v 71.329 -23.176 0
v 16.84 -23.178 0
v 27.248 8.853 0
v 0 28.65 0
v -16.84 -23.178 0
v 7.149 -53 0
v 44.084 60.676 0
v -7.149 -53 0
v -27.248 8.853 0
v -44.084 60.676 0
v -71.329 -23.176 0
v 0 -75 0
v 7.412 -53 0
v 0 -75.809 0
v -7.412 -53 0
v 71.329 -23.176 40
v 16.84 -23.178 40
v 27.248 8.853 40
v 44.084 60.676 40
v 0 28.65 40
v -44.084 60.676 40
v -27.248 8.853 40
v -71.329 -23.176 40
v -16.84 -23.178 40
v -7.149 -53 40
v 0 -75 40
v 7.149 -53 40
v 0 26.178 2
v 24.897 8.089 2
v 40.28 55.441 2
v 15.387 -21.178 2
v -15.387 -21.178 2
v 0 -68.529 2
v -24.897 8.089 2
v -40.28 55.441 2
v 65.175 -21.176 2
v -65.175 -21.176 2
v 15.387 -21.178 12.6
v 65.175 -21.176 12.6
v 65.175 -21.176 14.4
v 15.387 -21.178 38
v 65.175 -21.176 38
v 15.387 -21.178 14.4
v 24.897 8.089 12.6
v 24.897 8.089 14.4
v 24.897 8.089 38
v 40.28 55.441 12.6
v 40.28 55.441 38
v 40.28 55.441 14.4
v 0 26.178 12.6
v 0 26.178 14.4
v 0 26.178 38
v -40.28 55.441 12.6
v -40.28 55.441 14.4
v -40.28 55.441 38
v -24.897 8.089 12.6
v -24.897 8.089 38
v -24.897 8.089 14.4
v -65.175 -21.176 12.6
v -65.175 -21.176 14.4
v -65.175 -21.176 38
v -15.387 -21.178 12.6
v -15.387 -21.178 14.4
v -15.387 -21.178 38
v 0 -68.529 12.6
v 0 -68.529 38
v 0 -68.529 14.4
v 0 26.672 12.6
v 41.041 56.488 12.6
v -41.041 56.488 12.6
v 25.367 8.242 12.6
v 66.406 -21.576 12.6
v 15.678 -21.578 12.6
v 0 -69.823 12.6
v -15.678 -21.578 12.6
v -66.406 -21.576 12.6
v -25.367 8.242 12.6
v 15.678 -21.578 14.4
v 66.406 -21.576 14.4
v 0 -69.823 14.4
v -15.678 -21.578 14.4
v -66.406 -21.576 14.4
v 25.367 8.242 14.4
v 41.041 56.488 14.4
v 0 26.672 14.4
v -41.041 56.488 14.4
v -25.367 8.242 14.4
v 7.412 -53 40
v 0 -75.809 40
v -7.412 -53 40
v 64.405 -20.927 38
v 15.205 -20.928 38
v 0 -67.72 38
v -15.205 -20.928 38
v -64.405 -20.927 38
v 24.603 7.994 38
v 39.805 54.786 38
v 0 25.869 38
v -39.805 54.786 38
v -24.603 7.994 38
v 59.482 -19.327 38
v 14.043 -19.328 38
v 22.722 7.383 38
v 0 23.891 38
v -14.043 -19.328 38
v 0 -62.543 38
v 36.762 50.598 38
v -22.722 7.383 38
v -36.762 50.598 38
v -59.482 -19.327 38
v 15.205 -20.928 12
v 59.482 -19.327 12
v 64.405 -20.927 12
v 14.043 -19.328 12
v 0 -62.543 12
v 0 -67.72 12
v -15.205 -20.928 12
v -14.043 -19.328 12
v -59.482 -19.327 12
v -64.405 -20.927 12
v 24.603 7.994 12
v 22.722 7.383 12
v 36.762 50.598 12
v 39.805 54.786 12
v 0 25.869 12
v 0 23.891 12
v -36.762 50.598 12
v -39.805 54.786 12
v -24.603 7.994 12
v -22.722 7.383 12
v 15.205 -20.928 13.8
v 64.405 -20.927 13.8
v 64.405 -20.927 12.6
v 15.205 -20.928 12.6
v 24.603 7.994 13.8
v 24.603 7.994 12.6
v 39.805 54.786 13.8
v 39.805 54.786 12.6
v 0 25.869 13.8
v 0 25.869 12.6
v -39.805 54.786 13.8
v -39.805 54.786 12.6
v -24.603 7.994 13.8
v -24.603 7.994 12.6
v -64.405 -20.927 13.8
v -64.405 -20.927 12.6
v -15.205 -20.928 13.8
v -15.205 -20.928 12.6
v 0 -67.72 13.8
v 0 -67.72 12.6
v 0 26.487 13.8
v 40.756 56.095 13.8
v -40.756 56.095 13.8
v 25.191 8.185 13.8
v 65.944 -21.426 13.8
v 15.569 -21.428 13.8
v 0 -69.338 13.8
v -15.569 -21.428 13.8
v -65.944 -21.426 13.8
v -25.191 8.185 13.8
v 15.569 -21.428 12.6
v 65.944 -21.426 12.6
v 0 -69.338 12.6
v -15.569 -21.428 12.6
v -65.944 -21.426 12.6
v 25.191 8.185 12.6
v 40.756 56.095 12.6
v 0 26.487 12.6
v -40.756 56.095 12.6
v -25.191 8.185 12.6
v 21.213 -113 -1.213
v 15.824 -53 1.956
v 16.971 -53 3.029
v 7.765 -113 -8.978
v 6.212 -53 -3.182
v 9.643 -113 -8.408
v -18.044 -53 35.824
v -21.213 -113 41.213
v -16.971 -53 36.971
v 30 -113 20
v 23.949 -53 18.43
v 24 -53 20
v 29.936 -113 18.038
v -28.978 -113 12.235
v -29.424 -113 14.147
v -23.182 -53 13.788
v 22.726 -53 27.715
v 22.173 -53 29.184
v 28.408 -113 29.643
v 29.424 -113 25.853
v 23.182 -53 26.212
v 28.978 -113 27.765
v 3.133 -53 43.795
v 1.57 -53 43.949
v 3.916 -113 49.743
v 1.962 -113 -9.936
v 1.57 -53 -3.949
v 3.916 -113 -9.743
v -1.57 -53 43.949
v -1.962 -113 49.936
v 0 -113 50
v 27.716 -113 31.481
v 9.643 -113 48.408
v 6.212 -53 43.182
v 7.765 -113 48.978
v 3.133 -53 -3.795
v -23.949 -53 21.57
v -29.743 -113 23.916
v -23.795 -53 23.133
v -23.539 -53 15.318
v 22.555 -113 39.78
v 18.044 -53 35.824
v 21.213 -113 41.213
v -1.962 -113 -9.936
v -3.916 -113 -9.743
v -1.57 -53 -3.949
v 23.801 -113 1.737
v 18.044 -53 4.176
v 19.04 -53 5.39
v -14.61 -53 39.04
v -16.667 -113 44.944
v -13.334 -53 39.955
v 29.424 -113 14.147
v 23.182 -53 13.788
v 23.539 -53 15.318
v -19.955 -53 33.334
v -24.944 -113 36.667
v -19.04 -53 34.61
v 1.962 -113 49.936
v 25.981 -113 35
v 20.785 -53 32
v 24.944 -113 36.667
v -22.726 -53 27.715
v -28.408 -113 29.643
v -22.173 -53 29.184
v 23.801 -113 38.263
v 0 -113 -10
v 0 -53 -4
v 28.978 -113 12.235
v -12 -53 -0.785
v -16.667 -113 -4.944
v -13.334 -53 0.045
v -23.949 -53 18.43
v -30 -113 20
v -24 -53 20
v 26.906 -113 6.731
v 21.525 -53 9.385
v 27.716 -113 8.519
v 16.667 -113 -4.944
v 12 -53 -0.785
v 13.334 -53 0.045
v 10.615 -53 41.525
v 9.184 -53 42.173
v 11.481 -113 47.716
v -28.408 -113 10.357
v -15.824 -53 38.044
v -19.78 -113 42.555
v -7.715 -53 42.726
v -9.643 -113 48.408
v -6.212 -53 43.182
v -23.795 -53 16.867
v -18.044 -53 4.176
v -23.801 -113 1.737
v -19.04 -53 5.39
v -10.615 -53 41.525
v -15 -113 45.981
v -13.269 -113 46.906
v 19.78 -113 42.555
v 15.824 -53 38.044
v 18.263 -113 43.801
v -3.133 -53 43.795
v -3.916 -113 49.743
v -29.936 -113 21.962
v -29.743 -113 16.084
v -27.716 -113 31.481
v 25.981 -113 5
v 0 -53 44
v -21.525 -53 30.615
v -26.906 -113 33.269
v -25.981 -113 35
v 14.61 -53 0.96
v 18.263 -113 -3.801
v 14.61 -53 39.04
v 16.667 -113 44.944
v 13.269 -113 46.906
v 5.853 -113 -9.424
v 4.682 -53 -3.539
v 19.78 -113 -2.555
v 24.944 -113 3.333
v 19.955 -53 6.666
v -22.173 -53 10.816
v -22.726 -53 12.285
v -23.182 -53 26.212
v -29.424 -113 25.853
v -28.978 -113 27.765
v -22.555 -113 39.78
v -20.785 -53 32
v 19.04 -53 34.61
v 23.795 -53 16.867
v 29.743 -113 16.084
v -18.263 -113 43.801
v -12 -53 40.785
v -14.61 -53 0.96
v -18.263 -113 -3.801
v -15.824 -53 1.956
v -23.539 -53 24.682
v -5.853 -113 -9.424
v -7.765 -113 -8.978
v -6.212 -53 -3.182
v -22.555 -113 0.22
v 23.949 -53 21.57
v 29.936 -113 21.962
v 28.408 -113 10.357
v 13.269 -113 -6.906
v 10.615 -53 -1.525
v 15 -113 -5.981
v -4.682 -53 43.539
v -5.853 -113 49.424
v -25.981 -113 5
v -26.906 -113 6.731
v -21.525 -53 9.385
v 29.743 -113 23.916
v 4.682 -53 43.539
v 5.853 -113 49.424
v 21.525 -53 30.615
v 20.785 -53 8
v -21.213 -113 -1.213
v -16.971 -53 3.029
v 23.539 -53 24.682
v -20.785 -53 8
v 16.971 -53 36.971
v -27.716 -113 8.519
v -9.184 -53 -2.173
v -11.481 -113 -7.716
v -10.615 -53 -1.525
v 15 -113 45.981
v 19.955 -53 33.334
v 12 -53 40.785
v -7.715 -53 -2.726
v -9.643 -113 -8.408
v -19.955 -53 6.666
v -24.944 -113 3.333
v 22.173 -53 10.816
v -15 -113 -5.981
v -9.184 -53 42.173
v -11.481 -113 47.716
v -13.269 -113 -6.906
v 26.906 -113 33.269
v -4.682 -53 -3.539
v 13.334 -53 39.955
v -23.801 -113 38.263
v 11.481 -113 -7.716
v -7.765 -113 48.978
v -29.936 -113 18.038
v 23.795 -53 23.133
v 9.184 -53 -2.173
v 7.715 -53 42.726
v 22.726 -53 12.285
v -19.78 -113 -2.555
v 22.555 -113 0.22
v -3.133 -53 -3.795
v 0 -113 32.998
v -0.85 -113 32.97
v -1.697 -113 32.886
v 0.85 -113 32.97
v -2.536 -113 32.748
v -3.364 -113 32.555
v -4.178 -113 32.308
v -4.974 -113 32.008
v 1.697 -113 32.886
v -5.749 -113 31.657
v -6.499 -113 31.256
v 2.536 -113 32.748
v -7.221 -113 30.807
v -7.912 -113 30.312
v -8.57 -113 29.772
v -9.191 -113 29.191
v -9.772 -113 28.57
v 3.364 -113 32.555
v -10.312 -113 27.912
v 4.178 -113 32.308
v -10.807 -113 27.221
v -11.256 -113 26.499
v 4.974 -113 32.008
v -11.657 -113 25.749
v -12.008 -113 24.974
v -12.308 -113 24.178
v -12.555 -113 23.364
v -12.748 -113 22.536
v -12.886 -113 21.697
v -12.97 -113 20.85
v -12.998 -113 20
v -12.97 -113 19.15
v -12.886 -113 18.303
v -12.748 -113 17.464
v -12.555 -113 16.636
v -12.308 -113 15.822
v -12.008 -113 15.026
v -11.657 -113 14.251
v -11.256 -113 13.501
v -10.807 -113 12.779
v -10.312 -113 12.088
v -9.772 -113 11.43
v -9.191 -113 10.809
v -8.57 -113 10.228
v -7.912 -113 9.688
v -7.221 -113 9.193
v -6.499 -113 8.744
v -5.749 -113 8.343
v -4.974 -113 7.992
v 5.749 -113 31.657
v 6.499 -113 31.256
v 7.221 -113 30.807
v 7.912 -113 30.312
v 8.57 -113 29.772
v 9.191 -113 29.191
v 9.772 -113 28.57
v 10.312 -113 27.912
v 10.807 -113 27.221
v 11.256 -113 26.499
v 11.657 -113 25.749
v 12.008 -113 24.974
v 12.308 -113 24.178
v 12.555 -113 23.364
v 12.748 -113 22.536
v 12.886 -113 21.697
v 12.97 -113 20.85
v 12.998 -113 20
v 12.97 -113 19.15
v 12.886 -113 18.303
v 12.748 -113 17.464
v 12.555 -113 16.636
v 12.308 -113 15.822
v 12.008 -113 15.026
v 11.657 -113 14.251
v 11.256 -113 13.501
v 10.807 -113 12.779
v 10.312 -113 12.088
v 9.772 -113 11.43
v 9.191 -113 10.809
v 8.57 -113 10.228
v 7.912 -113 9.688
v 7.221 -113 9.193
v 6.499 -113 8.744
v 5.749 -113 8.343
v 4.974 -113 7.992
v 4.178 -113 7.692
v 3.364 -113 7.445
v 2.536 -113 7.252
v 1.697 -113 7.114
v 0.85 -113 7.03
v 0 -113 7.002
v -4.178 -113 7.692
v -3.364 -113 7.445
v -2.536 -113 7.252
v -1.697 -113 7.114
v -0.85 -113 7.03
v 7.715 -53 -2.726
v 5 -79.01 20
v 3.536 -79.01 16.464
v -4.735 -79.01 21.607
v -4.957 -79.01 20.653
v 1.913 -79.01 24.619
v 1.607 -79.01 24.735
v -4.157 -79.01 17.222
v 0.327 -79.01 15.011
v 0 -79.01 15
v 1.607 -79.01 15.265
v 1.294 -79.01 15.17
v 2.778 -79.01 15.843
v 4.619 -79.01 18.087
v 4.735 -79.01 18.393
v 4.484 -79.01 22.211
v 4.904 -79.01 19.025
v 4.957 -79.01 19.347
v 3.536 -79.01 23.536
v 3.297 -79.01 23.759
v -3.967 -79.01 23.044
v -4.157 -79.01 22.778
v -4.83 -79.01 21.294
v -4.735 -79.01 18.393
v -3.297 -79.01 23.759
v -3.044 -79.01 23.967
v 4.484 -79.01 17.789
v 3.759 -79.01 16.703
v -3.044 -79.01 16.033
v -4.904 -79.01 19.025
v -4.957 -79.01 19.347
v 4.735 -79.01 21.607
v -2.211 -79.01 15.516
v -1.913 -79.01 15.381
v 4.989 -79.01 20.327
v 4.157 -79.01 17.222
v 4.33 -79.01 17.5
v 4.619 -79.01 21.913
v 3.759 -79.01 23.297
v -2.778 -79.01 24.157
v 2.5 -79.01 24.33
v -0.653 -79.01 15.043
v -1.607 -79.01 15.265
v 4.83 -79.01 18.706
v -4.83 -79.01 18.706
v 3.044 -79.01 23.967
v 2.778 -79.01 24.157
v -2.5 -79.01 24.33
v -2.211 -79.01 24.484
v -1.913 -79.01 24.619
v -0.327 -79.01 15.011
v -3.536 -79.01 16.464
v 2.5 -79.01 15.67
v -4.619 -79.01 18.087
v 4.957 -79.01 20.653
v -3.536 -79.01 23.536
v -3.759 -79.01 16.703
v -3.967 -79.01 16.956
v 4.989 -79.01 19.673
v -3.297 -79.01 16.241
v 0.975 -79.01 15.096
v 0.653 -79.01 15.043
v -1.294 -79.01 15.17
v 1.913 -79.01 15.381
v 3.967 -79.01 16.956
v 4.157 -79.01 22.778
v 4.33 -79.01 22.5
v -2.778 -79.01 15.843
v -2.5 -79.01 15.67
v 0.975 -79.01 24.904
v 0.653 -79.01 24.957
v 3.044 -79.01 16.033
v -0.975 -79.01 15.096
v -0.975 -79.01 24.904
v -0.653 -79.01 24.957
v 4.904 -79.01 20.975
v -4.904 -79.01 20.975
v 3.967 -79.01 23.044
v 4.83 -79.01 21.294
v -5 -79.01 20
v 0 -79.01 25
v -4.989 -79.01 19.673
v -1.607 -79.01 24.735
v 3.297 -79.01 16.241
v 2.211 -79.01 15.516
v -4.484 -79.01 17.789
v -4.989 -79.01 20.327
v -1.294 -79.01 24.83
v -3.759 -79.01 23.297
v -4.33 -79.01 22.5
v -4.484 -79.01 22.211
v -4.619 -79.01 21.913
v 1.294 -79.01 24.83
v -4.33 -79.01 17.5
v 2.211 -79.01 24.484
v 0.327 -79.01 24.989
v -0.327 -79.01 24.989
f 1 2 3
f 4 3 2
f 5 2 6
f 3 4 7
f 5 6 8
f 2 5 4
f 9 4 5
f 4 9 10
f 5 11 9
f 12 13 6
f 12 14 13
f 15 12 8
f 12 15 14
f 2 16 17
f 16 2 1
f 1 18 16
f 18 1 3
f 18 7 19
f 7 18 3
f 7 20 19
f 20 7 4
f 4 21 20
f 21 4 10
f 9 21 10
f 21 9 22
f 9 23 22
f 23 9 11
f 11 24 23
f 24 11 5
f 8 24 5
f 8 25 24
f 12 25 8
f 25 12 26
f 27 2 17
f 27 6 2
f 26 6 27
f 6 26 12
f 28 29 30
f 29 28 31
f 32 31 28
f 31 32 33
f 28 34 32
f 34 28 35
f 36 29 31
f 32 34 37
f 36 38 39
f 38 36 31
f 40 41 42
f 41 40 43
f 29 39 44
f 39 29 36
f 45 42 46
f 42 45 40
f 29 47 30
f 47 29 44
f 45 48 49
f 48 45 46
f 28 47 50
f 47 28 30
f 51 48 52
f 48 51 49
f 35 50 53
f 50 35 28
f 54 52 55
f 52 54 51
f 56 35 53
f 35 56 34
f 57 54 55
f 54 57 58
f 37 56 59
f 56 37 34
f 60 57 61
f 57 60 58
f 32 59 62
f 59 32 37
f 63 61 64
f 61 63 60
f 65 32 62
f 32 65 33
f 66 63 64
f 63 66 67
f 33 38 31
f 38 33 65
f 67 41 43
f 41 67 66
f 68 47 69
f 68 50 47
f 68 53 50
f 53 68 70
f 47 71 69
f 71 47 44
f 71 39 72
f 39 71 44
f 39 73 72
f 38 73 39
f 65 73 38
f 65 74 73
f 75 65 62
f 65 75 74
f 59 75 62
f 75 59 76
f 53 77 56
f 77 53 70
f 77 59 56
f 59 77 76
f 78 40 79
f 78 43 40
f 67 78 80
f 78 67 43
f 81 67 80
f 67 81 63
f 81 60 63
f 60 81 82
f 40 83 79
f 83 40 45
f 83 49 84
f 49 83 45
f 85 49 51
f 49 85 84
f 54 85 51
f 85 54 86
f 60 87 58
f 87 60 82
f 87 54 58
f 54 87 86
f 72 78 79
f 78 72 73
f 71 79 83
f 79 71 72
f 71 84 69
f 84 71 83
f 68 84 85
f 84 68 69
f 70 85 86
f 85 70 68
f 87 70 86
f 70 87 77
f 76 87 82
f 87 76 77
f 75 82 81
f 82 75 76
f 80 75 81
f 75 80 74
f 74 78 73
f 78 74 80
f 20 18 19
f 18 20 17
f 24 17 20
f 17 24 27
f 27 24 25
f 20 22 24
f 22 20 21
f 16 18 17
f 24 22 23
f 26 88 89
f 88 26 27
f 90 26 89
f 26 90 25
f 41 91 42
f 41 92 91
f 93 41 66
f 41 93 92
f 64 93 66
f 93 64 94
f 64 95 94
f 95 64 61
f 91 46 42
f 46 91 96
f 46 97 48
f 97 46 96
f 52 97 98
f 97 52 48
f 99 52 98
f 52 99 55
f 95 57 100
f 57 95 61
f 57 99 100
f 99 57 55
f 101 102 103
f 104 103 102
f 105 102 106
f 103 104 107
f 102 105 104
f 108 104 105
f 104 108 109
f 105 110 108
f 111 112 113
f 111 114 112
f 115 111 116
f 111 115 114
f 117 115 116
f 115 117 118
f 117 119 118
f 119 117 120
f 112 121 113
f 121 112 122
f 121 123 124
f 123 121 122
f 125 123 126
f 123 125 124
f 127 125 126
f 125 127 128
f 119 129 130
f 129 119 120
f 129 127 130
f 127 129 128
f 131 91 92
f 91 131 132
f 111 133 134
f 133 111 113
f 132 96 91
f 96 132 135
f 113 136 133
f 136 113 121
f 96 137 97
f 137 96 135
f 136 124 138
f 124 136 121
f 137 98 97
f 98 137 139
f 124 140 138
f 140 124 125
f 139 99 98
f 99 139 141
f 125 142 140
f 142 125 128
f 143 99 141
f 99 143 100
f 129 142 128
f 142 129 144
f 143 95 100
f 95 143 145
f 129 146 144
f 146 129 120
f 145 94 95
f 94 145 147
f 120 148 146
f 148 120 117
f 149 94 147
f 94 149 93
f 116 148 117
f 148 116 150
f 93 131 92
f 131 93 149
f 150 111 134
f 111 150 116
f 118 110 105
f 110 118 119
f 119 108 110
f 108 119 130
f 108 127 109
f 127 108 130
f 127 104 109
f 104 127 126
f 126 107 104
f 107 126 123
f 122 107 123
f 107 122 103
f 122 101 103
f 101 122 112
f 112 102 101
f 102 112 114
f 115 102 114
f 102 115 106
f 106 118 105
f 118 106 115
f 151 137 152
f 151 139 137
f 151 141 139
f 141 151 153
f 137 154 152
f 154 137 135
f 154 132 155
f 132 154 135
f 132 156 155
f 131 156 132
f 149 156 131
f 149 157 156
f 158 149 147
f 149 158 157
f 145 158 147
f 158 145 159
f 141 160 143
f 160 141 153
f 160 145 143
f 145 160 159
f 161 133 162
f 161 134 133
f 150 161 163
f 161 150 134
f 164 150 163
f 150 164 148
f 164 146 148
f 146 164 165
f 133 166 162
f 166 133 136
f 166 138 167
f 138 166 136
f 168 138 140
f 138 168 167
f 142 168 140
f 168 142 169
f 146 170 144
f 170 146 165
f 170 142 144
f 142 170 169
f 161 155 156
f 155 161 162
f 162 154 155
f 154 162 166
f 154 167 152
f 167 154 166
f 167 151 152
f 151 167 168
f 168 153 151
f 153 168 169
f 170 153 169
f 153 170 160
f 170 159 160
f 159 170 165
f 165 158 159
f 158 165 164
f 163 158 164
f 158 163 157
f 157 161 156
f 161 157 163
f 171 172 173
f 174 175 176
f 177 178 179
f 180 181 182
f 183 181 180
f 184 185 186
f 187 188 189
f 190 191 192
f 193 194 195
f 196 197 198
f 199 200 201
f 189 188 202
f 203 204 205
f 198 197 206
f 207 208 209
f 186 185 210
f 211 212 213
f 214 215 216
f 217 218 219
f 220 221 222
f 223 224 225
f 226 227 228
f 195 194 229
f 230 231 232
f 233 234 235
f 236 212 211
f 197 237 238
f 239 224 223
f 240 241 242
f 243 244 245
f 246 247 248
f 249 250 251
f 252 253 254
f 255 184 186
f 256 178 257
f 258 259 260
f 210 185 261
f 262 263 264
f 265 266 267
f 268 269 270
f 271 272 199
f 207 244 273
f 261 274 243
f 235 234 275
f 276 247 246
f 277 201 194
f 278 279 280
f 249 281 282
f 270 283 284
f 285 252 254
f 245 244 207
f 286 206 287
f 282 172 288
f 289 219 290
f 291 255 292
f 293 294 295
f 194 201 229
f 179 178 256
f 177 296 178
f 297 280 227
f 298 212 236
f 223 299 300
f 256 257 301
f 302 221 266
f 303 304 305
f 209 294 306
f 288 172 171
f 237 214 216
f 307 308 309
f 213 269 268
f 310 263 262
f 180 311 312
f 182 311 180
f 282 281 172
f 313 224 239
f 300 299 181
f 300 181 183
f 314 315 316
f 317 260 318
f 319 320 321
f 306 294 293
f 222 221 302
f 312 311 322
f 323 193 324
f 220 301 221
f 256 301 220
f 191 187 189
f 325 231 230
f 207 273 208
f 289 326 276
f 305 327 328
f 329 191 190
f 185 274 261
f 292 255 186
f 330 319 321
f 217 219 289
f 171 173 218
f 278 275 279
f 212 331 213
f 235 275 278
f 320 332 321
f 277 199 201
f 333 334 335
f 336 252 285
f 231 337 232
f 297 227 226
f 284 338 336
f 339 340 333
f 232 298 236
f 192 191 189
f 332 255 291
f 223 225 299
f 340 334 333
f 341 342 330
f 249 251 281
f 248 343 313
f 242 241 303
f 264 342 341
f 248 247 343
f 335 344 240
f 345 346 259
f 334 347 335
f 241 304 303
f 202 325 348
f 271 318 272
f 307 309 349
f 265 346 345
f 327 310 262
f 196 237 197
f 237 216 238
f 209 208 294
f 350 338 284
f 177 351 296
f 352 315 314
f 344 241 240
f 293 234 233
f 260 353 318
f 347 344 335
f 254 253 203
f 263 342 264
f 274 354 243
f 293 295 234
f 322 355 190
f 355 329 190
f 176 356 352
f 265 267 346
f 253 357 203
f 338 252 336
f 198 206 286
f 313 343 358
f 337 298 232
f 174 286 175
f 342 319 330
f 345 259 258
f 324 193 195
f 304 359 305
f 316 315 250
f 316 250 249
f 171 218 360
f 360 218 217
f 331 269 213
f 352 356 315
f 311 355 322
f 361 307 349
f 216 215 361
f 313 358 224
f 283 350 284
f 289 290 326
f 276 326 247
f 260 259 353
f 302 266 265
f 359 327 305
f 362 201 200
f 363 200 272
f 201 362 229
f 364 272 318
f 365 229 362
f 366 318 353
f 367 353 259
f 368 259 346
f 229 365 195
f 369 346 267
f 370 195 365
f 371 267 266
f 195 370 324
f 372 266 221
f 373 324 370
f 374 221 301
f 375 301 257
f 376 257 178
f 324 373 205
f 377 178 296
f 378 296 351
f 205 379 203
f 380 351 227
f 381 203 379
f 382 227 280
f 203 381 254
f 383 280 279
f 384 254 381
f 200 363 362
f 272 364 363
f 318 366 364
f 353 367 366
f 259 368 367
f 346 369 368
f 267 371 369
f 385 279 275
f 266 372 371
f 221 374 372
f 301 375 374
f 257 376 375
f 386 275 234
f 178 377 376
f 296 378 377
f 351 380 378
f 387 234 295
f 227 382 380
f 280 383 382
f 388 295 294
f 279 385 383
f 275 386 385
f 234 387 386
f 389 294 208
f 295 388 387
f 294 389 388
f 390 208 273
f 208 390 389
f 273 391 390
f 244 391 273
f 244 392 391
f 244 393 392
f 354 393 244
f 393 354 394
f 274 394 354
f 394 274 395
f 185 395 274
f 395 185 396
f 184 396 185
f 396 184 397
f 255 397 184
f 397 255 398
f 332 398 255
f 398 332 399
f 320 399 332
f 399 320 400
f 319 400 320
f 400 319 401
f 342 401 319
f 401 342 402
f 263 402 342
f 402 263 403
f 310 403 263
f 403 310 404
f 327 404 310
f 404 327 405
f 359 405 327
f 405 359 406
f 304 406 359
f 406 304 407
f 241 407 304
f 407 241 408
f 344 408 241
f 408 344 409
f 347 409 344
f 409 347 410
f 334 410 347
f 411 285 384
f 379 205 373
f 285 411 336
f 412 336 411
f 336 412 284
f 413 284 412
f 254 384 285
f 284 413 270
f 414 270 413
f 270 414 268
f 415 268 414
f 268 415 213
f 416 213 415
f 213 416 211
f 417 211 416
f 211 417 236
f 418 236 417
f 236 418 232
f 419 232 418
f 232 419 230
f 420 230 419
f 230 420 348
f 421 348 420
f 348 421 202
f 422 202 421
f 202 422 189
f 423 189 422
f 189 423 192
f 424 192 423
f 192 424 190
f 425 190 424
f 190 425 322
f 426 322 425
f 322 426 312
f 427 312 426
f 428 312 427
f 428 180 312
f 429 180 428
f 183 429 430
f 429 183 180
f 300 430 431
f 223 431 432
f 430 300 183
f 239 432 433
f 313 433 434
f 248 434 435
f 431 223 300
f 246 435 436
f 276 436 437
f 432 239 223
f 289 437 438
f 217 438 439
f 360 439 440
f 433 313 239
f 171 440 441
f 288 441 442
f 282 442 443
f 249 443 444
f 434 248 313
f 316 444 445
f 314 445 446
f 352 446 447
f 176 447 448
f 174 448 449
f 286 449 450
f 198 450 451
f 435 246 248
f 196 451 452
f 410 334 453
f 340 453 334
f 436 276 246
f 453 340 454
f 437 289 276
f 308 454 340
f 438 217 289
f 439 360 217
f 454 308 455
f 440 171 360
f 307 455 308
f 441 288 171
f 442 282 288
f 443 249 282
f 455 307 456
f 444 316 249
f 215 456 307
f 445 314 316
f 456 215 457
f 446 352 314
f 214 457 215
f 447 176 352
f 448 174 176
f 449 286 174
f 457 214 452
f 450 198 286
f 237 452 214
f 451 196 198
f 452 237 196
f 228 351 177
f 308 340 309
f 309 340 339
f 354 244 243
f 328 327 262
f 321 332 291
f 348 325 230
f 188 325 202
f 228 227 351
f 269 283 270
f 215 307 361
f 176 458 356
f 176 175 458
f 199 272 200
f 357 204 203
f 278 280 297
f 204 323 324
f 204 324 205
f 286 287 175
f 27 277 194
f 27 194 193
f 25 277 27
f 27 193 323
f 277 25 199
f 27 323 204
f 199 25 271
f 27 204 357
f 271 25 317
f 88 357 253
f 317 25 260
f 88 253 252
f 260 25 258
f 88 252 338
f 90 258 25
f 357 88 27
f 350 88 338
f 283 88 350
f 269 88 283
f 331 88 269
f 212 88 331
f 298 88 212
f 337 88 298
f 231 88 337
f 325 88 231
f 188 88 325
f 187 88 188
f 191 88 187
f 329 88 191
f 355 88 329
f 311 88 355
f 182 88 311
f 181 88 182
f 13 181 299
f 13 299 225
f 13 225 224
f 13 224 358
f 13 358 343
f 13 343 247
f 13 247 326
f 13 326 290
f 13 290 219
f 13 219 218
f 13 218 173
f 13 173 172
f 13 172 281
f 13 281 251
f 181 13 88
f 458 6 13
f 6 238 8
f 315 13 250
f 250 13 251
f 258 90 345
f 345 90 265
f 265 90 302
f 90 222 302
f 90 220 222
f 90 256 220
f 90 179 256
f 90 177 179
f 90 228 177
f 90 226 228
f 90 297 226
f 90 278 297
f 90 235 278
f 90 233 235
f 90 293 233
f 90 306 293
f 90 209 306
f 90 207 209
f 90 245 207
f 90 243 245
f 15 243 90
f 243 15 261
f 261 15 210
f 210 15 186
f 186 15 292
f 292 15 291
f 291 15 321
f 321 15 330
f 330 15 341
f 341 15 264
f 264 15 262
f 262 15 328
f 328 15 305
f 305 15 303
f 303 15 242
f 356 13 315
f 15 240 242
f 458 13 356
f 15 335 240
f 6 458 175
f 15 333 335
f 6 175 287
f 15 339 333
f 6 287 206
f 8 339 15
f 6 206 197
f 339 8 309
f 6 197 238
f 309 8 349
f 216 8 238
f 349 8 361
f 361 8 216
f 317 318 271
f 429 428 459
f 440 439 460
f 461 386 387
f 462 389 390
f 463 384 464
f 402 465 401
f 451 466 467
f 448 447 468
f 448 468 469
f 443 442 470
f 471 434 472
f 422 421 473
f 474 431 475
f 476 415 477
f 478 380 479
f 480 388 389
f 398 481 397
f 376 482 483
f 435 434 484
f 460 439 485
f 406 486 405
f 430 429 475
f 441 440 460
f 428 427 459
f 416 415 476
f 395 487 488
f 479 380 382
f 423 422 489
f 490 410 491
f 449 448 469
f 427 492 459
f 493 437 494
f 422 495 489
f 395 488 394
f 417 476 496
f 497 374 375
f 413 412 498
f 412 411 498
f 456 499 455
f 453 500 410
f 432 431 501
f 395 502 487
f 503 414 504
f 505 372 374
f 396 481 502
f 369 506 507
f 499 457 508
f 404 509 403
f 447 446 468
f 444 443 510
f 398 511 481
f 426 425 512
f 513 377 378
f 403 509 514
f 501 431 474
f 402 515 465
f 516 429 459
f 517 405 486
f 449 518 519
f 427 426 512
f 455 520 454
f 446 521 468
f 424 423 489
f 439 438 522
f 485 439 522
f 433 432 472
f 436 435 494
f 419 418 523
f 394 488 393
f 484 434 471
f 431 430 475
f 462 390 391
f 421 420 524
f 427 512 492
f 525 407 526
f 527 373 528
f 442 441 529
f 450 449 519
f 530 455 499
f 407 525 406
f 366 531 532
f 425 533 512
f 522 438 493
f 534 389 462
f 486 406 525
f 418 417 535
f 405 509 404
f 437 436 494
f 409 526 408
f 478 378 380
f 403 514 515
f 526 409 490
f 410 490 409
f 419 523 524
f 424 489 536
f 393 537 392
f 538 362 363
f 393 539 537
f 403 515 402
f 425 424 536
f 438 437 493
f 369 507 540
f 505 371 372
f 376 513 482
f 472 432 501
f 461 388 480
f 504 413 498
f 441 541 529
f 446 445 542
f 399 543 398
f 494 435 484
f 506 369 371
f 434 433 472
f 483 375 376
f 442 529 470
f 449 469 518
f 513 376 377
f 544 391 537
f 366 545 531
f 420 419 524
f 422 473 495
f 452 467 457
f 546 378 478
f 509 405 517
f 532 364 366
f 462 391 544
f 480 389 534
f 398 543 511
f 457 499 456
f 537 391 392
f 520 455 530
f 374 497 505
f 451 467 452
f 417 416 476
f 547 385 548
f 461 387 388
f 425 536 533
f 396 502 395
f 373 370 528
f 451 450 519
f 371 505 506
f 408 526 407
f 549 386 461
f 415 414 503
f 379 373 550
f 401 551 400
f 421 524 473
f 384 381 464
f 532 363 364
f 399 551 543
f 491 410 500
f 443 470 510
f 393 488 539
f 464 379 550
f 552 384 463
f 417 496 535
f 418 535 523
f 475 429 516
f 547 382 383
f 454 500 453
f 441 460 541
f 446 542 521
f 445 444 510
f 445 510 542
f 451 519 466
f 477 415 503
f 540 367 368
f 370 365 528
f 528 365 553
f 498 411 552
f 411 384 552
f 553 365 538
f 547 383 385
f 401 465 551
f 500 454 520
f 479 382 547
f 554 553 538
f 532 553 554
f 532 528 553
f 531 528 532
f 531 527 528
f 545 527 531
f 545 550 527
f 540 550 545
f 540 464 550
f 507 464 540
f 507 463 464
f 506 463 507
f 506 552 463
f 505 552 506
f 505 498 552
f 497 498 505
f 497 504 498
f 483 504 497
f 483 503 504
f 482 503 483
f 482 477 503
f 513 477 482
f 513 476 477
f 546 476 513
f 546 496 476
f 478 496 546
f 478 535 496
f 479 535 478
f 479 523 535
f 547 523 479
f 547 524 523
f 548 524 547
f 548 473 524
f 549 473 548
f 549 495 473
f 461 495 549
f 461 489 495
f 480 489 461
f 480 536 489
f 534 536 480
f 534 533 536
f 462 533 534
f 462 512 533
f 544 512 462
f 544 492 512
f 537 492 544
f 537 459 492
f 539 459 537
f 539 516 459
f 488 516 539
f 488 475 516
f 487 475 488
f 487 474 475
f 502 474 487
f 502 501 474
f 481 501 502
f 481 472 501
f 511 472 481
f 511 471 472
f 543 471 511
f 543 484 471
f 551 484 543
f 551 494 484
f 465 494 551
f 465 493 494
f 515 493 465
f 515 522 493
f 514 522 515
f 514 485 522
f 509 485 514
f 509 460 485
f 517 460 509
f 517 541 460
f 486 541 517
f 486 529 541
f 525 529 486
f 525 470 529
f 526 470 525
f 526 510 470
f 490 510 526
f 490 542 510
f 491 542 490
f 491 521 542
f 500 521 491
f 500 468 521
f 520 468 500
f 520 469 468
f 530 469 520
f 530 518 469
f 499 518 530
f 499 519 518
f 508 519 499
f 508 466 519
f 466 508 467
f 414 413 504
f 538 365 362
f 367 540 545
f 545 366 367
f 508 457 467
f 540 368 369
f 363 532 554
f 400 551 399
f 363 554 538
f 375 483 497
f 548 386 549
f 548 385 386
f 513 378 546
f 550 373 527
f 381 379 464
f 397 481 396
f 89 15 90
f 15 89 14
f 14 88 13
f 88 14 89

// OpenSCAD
// Christmas Star Tree-Topper Box
// Three printable parts:
//   part = "front"    -> front half-shell (star shaped, prints face down)
//   part = "back"     -> back half-shell with snap lip (prints face down)
//   part = "base"     -> conic base that slides over the tree tip and
//                        locks the two halves at the bottom star point
//   part = "assembly" -> preview of all parts assembled
//
// Render STLs with:
//   openscad -o front.stl -D part=\"front\" star_box.scad
//
// All dimensions in millimeters.

part = "assembly";
//part = "front";
//part = "back";
//part = "base";

/* ---------- Star parameters ---------- */
star_points   = 5;
R             = 75;            // outer radius (tip to center) -> 150 mm tip-to-tip
r             = R * 0.382;     // inner radius of the pentagram
thickness     = 40;            // total box depth (front + back)
wall          = 2;             // wall / face thickness
clearance     = 0.25;          // printing clearance for fits

/* ---------- Snap-fit parameters ---------- */
lip_h         = 8;             // how far the back lip slides into the front
lip_w         = 1.6;           // lip wall width
bump          = 0.5;           // snap ridge interference
ridge_h       = 1.2;           // snap ridge band height
groove_h      = 1.8;           // groove band height (slightly taller)

/* ---------- Conic base parameters ---------- */
cone_h        = 60;            // cone height
cone_r_bottom = 30;            // outer radius at the wide (bottom) end
cone_r_top    = 24;            // outer radius at the top end
cone_wall     = 3;             // minimum cone wall
socket_depth  = 22;            // how deep the star bottom tip sinks into the cone
tree_hole_r   = 13;            // tree tip hole radius at the bottom
tree_hole_top = 5;             // tree tip hole radius at the top of the hole
tree_hole_h   = 34;            // tree tip hole depth (from the bottom)

$fn = 96;
half = thickness / 2;

/* ---------- 2D star ---------- */
module star2d() {
    // one point straight down (-Y), so the bottom tip meets the cone
    polygon([for (i = [0 : 2 * star_points - 1])
        let (a = -90 + i * 180 / star_points,
             rad = (i % 2 == 0) ? R : r)
        [rad * cos(a), rad * sin(a)]]);
}

module star_offset(d) { offset(delta = d) star2d(); }

/* ---------- Front half-shell ----------
   Prints as modeled: outer face on the bed (z = 0), cavity opening up. */
module front() {
    difference() {
        linear_extrude(half) star2d();
        // cavity
        translate([0, 0, wall])
            linear_extrude(half) star_offset(-wall);
        // snap groove in the inner wall, where the back lip's ridge lands
        translate([0, 0, half - lip_h + 0.6])
            linear_extrude(groove_h) difference() {
                star_offset(-wall + bump - 0.1);
                star_offset(-wall - clearance);
            }
    }
}

/* ---------- Back half-shell ----------
   Same shell as the front plus an inner lip with a snap ridge. */
module back() {
    // shell
    difference() {
        linear_extrude(half) star2d();
        translate([0, 0, wall])
            linear_extrude(half) star_offset(-wall);
    }
    // lip that slides inside the front cavity, rising from the floor
    translate([0, 0, wall])
        linear_extrude(half - wall + lip_h) difference() {
            star_offset(-wall - clearance);
            star_offset(-wall - clearance - lip_w);
        }
    // snap ridge near the lip tip
    translate([0, 0, half + lip_h - 0.6 - ridge_h])
        linear_extrude(ridge_h) difference() {
            star_offset(-wall - clearance + bump);
            star_offset(-wall - clearance - lip_w);
        }
}

/* ---------- Assembled star box (for the cone socket) ---------- */
module star_solid(extra = 0) {
    // full closed box outline, slightly enlarged by `extra` for clearance
    linear_extrude(thickness) star_offset(extra);
}

/* ---------- Conic base ----------
   Modeled in its printing orientation: wide end on the bed, axis = Z.
   In use it is flipped is not needed: tree tip enters from the bottom,
   the star's bottom point snaps into the socket cut in the top. */
module base() {
    difference() {
        cylinder(h = cone_h, r1 = cone_r_bottom, r2 = cone_r_top);
        // tree tip hole from the bottom
        translate([0, 0, -0.01])
            cylinder(h = tree_hole_h, r1 = tree_hole_r, r2 = tree_hole_top);
        // star-tip socket cut into the top: the star (with clearance)
        // positioned tip-down, sunk socket_depth into the cone
        translate([0, 0, cone_h - socket_depth + R])
            rotate([90, 0, 0])
                translate([0, 0, -thickness / 2])
                    star_solid(clearance);
    }
}

/* ---------- Assembly preview ---------- */
module assembly() {
    color("firebrick") front();
    color("darkred") translate([0, 0, thickness]) mirror([0, 0, 1]) back();
    color("goldenrod")
        translate([0, -R + socket_depth - cone_h, thickness / 2])
            rotate([-90, 0, 0]) base();
}

if (part == "front")    front();
if (part == "back")     back();
if (part == "base")     base();
if (part == "assembly") assembly();
